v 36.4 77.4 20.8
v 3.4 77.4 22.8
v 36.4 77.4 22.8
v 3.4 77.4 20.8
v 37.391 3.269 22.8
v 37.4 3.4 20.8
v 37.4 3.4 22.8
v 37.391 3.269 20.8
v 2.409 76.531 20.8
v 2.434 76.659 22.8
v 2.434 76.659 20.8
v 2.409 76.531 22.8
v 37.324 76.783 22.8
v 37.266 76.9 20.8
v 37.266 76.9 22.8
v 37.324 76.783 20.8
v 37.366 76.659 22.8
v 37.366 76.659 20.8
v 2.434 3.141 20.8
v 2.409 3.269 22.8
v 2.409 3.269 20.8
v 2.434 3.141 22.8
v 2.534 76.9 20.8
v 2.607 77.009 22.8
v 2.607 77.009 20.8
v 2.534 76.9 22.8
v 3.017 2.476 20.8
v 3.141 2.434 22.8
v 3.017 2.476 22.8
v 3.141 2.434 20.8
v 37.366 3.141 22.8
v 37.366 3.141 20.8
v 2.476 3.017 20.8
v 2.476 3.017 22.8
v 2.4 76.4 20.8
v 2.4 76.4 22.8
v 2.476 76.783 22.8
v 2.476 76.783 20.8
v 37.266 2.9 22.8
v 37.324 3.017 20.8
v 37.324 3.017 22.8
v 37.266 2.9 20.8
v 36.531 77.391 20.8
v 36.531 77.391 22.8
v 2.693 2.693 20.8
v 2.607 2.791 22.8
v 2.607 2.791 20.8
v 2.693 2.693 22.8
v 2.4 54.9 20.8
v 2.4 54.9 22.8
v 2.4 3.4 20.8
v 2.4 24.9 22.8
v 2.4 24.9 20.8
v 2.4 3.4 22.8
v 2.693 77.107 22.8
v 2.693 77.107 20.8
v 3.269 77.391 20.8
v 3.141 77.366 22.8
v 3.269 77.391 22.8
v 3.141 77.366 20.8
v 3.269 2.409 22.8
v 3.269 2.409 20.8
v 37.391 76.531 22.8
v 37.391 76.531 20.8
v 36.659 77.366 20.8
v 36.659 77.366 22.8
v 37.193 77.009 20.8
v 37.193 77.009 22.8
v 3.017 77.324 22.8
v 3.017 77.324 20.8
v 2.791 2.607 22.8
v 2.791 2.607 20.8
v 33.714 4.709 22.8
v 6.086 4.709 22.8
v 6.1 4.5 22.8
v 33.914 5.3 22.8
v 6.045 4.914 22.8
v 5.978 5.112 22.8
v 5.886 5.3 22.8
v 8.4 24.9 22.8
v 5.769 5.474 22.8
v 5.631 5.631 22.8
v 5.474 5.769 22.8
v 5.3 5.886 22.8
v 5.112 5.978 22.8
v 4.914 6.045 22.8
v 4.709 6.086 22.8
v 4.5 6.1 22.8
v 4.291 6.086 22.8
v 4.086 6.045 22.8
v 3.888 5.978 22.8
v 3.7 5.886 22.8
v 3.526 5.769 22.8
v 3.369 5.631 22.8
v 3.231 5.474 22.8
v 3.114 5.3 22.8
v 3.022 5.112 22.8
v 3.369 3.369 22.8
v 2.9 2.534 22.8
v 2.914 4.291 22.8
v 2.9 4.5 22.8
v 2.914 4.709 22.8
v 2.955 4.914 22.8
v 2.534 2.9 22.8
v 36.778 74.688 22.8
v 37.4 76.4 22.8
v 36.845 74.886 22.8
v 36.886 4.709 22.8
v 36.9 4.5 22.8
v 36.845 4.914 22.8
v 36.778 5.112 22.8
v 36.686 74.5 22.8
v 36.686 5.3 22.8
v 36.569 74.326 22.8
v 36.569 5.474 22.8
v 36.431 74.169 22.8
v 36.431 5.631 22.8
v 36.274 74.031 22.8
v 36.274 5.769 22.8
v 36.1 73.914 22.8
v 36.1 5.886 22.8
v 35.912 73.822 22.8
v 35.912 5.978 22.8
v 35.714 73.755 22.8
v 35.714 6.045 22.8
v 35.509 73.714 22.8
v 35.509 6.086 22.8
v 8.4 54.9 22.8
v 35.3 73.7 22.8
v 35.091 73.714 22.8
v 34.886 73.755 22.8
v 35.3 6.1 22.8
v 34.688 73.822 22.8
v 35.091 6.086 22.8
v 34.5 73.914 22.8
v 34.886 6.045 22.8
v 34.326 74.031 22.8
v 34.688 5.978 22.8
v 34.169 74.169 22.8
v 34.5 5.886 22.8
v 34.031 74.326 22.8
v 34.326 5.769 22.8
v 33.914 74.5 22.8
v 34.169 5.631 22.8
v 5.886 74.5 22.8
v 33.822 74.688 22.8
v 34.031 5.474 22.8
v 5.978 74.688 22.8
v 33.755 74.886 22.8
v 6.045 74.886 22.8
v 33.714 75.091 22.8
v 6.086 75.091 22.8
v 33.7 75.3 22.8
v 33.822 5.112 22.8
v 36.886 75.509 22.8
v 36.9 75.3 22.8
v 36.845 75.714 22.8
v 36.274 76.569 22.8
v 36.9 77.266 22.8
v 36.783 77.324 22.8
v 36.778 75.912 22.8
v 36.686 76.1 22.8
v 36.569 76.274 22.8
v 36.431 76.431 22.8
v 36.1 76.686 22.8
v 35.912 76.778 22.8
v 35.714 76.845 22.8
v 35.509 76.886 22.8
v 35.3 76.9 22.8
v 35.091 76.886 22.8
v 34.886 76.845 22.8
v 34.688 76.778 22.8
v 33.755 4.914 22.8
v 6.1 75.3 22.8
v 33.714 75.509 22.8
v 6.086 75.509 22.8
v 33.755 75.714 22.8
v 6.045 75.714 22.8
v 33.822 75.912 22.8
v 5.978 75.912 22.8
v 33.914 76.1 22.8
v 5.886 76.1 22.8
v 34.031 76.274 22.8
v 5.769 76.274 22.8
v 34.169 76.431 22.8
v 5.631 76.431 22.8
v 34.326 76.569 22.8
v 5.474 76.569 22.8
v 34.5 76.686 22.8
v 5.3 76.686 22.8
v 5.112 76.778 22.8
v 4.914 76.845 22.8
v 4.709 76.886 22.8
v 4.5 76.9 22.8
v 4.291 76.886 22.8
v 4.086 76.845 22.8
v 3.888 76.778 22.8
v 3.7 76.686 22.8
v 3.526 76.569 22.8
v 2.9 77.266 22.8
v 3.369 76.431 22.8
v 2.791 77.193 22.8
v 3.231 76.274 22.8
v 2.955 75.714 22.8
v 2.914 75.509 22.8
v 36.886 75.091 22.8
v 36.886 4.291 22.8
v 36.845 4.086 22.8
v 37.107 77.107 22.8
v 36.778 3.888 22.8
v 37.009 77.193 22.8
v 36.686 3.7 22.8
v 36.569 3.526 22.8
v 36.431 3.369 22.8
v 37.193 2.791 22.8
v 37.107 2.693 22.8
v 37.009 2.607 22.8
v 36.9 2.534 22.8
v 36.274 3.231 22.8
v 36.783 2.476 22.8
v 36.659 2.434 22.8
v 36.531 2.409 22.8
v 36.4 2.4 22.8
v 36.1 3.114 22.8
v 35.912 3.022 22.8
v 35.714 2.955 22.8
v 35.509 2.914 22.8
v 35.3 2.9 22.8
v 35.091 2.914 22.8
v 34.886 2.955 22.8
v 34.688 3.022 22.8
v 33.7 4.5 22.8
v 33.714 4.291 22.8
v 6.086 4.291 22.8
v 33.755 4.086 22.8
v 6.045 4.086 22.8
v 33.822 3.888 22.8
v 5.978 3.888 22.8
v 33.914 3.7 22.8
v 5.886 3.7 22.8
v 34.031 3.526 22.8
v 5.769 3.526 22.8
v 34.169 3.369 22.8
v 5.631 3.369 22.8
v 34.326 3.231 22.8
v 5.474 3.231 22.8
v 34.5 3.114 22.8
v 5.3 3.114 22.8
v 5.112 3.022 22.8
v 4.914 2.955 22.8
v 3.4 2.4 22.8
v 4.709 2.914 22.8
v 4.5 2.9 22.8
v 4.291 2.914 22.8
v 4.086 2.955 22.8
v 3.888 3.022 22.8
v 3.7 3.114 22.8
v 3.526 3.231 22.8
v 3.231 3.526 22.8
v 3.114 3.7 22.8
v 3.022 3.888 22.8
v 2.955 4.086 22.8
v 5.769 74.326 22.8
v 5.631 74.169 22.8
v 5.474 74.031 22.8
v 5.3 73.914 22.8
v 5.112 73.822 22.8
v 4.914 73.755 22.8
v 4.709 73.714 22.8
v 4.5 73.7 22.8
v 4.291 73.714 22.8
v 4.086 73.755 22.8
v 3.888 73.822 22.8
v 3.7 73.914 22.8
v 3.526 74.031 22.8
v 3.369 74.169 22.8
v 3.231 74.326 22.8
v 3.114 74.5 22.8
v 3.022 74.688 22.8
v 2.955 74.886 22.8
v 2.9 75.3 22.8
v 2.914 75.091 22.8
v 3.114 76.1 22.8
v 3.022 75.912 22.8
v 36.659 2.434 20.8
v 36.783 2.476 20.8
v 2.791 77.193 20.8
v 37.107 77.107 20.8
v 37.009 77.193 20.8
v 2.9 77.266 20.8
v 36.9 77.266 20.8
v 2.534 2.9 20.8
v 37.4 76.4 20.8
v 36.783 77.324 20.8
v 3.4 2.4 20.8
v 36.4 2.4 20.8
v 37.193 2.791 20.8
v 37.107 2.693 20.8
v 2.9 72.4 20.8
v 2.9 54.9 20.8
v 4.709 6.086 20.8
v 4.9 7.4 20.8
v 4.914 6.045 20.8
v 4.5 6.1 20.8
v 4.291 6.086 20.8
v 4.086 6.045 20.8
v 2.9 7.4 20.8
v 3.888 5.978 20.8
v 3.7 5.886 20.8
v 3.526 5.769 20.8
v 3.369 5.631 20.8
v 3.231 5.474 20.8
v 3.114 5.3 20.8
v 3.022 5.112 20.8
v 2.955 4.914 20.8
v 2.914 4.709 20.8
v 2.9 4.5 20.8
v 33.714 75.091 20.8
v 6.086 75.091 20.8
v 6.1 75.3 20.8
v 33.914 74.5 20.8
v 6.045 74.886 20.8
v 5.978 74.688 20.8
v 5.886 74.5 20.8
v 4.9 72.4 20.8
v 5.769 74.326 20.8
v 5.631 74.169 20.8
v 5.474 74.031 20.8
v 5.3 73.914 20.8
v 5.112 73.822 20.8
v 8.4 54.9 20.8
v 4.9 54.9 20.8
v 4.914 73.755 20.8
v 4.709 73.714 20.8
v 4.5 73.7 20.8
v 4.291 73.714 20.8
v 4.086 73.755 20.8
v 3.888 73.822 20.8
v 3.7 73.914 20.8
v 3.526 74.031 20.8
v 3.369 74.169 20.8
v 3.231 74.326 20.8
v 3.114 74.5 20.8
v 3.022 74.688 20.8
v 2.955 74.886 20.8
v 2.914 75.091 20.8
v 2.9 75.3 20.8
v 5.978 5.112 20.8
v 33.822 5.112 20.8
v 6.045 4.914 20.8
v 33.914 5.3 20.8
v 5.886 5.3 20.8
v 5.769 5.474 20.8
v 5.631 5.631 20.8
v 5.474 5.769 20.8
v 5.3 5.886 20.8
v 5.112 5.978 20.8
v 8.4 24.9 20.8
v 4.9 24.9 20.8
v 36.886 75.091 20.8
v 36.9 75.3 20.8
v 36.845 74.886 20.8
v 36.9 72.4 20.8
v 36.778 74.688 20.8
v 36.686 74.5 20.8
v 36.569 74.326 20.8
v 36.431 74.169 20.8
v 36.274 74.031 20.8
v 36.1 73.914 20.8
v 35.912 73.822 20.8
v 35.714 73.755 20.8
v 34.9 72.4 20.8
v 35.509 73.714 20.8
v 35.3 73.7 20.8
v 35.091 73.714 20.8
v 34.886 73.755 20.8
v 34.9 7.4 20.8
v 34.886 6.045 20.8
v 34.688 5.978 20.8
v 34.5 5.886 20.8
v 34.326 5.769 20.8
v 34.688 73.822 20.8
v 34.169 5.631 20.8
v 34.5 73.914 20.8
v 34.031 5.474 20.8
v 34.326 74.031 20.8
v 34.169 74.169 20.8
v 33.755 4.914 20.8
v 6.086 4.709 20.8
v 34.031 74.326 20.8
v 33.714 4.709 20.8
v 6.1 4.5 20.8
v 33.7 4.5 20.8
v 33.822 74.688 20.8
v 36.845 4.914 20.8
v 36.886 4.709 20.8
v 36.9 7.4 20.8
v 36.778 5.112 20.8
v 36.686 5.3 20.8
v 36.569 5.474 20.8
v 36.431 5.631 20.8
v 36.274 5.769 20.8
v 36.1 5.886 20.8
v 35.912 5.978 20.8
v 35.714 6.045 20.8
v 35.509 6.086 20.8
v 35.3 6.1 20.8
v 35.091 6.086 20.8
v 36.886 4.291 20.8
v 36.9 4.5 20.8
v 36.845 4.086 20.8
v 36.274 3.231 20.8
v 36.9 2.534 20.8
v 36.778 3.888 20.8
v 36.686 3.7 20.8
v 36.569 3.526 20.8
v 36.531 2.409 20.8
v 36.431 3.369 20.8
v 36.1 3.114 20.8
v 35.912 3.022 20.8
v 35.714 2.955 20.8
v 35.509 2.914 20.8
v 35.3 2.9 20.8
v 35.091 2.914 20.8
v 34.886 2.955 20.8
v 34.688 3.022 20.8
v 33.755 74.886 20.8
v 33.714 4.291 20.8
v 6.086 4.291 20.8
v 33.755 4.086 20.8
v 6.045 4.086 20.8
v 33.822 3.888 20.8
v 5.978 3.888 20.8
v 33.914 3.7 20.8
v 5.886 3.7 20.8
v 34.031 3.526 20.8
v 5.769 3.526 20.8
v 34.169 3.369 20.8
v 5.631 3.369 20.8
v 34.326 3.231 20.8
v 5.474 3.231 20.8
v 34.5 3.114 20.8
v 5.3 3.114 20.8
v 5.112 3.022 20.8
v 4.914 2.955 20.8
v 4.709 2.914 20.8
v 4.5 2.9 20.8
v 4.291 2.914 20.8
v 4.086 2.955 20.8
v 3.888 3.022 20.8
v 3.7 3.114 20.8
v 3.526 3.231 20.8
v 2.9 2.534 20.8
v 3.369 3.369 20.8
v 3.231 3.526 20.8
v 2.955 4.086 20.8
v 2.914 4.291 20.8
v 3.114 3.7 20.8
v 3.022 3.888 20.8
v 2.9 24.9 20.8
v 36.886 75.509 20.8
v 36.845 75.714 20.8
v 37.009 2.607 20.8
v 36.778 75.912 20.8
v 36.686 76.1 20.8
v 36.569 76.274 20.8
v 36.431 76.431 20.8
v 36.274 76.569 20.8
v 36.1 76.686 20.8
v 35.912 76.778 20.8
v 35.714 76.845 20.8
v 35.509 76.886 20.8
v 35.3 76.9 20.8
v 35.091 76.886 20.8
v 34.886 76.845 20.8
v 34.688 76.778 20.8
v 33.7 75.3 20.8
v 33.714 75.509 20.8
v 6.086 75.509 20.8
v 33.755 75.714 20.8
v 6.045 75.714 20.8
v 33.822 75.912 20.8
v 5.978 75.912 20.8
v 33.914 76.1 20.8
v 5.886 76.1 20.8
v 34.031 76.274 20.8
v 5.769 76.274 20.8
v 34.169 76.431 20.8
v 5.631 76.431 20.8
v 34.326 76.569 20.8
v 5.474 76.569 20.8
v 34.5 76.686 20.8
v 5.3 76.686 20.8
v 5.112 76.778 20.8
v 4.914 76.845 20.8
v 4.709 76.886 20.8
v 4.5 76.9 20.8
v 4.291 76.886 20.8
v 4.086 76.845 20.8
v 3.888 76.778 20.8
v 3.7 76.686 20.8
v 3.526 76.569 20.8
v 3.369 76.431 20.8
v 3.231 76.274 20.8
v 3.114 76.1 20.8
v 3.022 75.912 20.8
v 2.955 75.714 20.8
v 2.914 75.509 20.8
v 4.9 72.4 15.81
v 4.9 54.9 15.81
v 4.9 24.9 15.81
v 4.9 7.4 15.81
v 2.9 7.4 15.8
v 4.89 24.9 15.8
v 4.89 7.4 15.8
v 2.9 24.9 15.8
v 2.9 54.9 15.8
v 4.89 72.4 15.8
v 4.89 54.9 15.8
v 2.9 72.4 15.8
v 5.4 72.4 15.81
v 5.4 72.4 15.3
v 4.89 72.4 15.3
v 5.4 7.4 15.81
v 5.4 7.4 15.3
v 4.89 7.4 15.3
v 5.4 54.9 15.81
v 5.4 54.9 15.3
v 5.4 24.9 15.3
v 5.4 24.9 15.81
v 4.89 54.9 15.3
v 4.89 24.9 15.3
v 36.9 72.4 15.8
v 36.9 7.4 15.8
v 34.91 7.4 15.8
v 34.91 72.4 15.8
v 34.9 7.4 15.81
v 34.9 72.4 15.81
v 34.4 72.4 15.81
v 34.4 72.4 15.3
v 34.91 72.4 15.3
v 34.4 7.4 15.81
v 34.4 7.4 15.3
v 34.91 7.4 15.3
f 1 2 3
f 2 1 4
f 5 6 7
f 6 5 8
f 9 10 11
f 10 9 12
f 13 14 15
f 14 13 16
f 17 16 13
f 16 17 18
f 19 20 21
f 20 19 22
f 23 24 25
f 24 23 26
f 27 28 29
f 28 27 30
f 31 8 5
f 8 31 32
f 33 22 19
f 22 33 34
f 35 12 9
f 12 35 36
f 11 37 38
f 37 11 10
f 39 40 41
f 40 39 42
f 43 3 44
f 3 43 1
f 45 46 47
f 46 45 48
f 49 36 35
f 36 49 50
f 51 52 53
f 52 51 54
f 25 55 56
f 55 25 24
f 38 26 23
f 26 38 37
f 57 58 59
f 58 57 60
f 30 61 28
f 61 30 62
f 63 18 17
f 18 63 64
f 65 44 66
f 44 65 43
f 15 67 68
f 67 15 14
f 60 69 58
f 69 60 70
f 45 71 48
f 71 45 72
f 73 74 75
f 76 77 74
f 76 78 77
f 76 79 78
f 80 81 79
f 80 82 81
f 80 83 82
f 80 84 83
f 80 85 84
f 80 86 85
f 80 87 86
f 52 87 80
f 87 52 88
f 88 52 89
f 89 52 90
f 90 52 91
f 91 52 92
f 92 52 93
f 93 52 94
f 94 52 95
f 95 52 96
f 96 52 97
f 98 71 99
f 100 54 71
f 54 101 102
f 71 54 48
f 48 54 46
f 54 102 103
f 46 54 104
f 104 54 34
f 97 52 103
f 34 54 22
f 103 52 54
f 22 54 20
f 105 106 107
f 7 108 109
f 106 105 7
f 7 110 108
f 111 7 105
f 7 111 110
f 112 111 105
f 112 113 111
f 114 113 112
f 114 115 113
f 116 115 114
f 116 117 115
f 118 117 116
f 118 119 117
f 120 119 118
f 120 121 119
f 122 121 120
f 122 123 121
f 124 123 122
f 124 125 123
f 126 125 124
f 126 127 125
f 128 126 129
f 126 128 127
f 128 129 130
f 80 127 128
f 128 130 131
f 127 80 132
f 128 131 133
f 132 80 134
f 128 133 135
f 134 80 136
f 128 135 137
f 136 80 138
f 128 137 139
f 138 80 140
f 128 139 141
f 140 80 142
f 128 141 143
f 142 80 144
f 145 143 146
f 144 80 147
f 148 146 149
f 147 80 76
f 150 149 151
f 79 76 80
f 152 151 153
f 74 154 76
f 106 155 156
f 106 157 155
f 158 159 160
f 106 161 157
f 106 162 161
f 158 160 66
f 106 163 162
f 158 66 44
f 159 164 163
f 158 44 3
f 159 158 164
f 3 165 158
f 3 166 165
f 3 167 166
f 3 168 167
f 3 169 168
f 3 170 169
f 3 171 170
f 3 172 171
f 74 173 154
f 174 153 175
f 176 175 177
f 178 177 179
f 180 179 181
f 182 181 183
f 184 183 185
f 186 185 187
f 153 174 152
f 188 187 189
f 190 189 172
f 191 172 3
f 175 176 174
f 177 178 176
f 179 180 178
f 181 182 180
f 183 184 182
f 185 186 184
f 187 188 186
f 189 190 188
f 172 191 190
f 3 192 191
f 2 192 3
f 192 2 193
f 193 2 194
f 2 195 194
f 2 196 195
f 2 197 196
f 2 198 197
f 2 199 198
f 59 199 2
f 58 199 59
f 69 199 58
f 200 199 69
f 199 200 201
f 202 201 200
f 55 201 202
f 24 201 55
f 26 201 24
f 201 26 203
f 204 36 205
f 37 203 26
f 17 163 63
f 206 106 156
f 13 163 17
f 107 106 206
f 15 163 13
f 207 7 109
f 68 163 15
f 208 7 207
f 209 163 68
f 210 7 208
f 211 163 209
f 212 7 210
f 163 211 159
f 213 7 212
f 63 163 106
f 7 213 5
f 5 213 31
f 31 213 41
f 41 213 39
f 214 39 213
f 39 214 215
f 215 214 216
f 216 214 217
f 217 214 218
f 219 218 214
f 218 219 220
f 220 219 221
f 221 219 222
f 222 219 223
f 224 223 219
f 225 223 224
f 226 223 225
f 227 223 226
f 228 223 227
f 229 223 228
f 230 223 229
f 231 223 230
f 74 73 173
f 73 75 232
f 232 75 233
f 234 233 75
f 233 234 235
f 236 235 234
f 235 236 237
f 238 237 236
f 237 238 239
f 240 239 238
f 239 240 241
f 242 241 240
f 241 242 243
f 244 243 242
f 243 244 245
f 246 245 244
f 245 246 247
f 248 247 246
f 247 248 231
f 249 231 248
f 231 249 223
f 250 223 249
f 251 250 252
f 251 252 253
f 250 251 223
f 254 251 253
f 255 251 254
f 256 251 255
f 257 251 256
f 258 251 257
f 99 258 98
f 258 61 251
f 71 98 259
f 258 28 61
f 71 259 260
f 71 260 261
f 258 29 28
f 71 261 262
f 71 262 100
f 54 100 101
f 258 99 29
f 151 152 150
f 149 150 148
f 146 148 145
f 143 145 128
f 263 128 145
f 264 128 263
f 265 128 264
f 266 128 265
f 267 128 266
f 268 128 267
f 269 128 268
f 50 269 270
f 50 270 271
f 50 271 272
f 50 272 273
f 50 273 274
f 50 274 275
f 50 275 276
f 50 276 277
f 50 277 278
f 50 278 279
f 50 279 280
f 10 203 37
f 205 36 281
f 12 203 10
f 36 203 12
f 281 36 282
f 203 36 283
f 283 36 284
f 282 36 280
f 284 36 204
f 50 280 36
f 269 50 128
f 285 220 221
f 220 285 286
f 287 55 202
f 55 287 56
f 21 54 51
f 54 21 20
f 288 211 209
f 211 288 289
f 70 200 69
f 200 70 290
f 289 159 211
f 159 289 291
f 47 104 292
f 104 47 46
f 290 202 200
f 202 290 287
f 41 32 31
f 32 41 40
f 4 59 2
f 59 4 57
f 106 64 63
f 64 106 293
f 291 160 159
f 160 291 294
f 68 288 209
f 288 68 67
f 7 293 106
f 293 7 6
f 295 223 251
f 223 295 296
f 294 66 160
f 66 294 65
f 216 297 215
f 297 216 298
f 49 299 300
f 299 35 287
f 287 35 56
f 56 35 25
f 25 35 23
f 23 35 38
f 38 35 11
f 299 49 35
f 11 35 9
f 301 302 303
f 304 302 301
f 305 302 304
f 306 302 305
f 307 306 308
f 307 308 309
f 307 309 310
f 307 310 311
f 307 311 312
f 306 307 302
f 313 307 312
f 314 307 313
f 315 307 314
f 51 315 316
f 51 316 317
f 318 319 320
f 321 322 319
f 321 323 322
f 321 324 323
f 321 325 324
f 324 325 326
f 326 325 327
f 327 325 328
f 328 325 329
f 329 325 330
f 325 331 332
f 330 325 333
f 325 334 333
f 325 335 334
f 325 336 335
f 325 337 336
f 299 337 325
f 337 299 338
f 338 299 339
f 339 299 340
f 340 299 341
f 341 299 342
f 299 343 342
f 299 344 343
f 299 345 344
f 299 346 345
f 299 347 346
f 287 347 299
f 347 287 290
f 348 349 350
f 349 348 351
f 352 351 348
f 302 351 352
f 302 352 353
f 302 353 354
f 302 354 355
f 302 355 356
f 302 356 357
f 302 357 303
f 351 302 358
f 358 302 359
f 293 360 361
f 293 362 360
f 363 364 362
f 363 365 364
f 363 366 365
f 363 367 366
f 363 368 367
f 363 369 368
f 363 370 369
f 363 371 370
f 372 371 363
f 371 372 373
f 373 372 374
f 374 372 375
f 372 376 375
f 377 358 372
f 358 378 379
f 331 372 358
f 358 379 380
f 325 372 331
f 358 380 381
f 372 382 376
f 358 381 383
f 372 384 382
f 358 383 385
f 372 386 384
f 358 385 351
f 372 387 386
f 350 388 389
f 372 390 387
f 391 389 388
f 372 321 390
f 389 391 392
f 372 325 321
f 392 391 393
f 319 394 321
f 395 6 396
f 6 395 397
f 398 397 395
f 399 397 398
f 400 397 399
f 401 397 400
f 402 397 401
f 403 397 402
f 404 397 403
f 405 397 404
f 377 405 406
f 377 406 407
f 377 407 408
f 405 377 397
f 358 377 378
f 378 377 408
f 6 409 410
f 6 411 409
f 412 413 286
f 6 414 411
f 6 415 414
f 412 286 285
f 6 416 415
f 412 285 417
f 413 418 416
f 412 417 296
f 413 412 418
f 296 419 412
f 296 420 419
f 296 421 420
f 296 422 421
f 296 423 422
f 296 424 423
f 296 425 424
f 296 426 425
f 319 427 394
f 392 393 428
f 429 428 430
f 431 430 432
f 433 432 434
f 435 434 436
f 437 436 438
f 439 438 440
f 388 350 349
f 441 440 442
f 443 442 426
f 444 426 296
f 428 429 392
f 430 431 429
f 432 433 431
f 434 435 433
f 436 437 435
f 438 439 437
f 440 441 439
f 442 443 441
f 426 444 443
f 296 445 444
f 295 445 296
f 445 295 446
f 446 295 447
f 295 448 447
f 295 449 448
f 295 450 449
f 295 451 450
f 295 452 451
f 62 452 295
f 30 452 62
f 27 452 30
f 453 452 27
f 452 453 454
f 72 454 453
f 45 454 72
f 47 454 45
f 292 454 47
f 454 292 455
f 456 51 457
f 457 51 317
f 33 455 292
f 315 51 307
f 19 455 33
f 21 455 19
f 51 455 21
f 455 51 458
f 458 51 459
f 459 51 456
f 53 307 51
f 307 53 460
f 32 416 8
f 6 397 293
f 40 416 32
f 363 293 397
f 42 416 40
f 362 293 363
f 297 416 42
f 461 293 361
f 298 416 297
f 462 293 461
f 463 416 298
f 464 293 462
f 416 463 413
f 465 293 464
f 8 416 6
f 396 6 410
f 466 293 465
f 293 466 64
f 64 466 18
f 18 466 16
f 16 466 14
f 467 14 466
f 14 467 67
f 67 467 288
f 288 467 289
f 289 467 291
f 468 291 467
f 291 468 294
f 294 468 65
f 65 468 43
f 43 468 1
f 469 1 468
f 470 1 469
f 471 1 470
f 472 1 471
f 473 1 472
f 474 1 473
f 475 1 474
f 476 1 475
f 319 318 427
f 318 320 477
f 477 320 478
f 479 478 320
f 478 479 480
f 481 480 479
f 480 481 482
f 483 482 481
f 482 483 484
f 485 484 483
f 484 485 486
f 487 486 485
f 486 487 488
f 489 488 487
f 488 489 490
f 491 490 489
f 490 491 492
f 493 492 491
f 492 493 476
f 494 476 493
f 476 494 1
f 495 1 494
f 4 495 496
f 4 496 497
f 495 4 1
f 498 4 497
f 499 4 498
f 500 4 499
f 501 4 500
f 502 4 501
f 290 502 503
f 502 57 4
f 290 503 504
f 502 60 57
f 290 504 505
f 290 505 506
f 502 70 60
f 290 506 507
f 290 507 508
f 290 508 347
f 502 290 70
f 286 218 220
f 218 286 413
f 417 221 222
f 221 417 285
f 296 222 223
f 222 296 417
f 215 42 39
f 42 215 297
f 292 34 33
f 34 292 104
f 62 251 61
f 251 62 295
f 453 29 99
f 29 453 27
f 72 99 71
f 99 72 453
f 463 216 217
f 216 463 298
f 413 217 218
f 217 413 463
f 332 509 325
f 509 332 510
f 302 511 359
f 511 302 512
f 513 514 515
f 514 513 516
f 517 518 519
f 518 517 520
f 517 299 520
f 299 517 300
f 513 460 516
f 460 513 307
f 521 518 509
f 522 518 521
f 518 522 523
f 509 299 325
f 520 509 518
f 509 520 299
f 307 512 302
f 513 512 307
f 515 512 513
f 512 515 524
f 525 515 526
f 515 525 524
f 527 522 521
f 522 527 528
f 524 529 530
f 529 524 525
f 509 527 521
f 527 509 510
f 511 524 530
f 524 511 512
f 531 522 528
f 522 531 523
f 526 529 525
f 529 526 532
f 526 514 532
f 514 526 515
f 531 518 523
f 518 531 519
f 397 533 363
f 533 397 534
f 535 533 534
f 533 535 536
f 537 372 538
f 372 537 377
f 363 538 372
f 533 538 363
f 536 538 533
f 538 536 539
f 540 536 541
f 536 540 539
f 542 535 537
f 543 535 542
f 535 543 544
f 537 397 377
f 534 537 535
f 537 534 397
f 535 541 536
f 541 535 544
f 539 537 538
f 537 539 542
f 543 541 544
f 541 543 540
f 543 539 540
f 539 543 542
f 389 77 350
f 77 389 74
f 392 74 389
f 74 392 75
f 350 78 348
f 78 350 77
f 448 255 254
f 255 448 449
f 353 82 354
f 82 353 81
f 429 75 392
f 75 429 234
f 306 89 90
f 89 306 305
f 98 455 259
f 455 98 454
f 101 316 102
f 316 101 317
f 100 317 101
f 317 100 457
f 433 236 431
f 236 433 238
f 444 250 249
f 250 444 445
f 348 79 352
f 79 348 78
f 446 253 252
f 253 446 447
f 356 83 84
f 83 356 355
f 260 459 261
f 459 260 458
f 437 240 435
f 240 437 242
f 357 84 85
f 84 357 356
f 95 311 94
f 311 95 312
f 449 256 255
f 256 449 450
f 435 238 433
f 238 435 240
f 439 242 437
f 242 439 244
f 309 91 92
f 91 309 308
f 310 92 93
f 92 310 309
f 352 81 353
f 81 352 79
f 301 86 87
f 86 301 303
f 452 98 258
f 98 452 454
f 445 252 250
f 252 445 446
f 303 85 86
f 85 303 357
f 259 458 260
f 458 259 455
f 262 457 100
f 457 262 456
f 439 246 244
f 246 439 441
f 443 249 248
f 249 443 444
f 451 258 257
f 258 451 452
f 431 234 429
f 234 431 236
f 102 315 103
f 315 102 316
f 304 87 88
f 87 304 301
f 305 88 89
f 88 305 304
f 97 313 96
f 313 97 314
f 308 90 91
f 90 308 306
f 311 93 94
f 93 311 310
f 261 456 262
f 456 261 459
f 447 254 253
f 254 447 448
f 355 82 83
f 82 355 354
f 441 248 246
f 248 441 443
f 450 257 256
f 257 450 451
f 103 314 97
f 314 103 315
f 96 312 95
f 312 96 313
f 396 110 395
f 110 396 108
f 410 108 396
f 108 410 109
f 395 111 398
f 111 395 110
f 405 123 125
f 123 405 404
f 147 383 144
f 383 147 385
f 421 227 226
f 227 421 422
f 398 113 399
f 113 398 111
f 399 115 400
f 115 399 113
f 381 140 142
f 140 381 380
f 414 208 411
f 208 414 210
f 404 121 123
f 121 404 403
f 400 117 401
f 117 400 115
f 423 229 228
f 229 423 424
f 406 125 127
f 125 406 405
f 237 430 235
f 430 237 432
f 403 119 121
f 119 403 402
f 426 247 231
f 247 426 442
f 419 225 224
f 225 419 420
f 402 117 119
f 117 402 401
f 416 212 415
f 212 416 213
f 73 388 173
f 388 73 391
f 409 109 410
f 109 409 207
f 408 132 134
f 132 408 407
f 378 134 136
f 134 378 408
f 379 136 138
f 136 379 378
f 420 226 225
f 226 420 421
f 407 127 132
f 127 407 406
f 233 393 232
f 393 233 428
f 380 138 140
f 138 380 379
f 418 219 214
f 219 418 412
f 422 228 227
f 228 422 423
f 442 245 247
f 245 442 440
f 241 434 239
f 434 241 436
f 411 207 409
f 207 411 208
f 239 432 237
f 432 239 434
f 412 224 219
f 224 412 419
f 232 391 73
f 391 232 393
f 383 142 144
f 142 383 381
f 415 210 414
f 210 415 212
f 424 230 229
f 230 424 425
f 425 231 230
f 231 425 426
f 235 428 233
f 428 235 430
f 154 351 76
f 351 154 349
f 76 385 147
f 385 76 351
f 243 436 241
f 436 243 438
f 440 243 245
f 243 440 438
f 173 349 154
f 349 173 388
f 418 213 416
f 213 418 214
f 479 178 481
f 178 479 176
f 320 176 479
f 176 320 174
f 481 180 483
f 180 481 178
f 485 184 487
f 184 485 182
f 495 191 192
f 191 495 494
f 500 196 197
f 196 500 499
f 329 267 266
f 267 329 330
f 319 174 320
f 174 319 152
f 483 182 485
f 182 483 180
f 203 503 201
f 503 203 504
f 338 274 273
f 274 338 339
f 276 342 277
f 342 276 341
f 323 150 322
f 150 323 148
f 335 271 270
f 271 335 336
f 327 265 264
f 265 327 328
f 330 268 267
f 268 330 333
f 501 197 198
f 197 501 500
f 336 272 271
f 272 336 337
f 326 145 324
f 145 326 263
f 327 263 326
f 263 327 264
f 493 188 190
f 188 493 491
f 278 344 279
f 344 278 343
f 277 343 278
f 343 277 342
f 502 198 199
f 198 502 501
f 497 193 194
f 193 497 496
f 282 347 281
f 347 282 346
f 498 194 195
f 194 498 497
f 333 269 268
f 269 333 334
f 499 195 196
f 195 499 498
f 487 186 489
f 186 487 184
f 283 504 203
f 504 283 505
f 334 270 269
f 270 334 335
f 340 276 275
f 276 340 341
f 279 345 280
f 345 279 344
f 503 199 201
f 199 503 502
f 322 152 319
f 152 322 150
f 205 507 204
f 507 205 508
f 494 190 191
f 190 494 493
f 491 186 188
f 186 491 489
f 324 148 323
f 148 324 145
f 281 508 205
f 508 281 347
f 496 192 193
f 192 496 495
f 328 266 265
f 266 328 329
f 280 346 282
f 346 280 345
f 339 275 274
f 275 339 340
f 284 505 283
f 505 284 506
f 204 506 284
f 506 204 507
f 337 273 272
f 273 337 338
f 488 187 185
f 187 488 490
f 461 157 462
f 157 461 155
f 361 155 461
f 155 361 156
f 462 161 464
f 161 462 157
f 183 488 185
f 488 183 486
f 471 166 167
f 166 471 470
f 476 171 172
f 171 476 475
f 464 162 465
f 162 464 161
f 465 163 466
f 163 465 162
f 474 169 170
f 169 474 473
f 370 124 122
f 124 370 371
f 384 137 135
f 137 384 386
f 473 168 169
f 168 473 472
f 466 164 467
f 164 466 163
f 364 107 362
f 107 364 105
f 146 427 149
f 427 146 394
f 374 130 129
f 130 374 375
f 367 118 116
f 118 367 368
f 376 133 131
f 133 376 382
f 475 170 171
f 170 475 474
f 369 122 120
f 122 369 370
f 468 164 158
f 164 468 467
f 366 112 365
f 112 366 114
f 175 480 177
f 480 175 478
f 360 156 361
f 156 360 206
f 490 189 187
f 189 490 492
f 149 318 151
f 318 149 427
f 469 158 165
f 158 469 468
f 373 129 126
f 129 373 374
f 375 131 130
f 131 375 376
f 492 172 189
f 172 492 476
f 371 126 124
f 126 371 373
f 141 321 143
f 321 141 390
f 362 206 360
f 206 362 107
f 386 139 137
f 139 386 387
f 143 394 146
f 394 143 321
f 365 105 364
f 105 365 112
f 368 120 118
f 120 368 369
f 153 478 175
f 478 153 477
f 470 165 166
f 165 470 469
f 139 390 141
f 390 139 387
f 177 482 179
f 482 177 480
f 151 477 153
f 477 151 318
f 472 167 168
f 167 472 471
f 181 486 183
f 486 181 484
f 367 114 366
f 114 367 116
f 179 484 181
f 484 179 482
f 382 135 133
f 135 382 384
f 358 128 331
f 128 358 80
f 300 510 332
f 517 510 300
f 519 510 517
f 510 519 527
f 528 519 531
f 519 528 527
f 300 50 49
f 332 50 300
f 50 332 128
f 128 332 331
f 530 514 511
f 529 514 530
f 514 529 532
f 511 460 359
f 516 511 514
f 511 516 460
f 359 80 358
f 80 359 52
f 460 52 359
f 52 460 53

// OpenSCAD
// Dilder Top-Mid Plate (solid) — display cover plate with snap-fit rails, no window
//
// Drops into the base shell, rests on the upper shelf at z=20.8.
// Two long rails on the underside grip the display edges with a snap-fit lip.
// This variant has NO viewing window — use top-plate-windowed.scad for that.
//
// Export:
//   openscad -o top-plate-solid.3mf top-plate-solid.scad

$fn = 48;

// ---- Board (Olimex ESP32-S3-DevKit-Lipo) ----
board_len      = 56;
board_wid      = 28;
antenna_proj   = 6;

// ---- Waveshare 2.13" display ----
disp_len       = 65;
disp_wid       = 30;
disp_thk       = 5;

// ---- 1000 mAh battery ----
bat_len        = 52;
bat_wid        = 35;

// ---- Enclosure geometry ----
wall_thk       = 2;
plate_thk      = 2;
pillar         = 5;
slop           = 0.4;
bat_chamber_h  = 6;
disp_clear     = 1;
board_thk      = 1.6;
wroom_h        = 3.2;

screw_clr      = 3.2;

// ---- Rounding ----
plate_corner_r = 1;

// ---- Snap rails ----
snap_rail_w    = 2;
snap_lip_d     = 0.5;
snap_lip_h     = 0.5;

// ---- Wire pass-through ----
wire_hole_len  = 30;
wire_hole_depth = 6;

// ---- Z layout ----
z_base_top     = plate_thk;
z_mid_bot      = z_base_top + bat_chamber_h;
z_mid_top      = z_mid_bot + plate_thk;
z_board_bot    = z_mid_top;
z_board_top    = z_board_bot + board_thk;
z_wroom_top    = z_board_top + wroom_h;
z_disp_bot     = z_wroom_top + disp_clear;
z_disp_top     = z_disp_bot + disp_thk;

// ---- XY layout ----
inner_wid      = max(board_wid, disp_wid, bat_wid) + 2 * slop;
inner_len      = max(board_len + antenna_proj, disp_len + 2 * pillar, bat_len) + 2 * slop;
outer_wid      = inner_wid + 2 * wall_thk;
outer_len      = inner_len + 2 * wall_thk;

pillar_xy = [
    [wall_thk,                             wall_thk                            ],
    [outer_wid - wall_thk - pillar,        wall_thk                            ],
    [wall_thk,                             outer_len - wall_thk - pillar       ],
    [outer_wid - wall_thk - pillar,        outer_len - wall_thk - pillar       ],
];

disp_x         = (outer_wid - disp_wid) / 2;
disp_y         = (outer_len - disp_len) / 2;


// ============== SHARED ==============

module rounded_v_box(w, l, h, r, fn = 48) {
    hull() {
        for (x = [r, w - r])
            for (y = [r, l - r])
                translate([x, y, 0])
                    cylinder(r = r, h = h, $fn = fn);
    }
}


// ============== TOP-MID PLATE (SOLID) ==============

module top_plate_solid() {
    plate_w = inner_wid - 2 * slop;
    plate_l = inner_len - 2 * slop;
    plate_x = wall_thk + slop;
    plate_y = wall_thk + slop;

    rail_y_local      = disp_y - plate_y;
    rail_len          = disp_len;
    rail_x_left       = disp_x - plate_x - snap_rail_w;
    rail_x_right      = disp_x - plate_x + disp_wid;
    lip_x_left        = disp_x - plate_x;
    lip_x_right       = disp_x - plate_x + disp_wid - snap_lip_d;
    snap_rail_h       = disp_thk;

    wire_y = (plate_l - wire_hole_len) / 2;

    translate([plate_x, plate_y, z_disp_top])
    difference() {
        union() {
            rounded_v_box(plate_w, plate_l, plate_thk, plate_corner_r);

            // -X long rail (body + bottom lip)
            translate([rail_x_left, rail_y_local, -snap_rail_h])
                cube([snap_rail_w, rail_len, snap_rail_h]);
            translate([lip_x_left - 0.01, rail_y_local, -snap_rail_h - snap_lip_h])
                cube([snap_lip_d + 0.01, rail_len, snap_lip_h + 0.01]);

            // +X long rail
            translate([rail_x_right, rail_y_local, -snap_rail_h])
                cube([snap_rail_w, rail_len, snap_rail_h]);
            translate([lip_x_right, rail_y_local, -snap_rail_h - snap_lip_h])
                cube([snap_lip_d + 0.01, rail_len, snap_lip_h + 0.01]);
        }

        // Screw clearance holes
        for (p = pillar_xy)
            translate([p[0] + pillar/2 - plate_x, p[1] + pillar/2 - plate_y,
                       -snap_rail_h - snap_lip_h - 1])
                cylinder(h = plate_thk + snap_rail_h + snap_lip_h + 2, d = screw_clr);

        // Wire pass-through hole
        translate([-0.1, wire_y, -snap_rail_h - snap_lip_h - 0.1])
            cube([wire_hole_depth + 0.1, wire_hole_len,
                  plate_thk + snap_rail_h + snap_lip_h + 0.2]);
    }
}

top_plate_solid();
